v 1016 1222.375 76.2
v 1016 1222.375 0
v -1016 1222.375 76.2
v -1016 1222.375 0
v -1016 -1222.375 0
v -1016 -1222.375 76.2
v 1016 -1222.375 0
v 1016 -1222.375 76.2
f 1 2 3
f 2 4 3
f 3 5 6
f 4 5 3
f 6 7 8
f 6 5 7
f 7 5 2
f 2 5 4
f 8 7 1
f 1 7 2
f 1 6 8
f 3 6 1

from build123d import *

# Parameters (mm, degrees)
F0_W     = 1231.9
F0_H     = 2444.75
F1_DEPTH = 76.2
F2_DEPTH = 400.05
F3_DEPTH = 400.05


with BuildPart() as f1:
    # F0 (on Top) → F1 (new body)
    with BuildSketch(Plane.XY):
        Rectangle(F0_W, F0_H)
    extrude(amount=F1_DEPTH)

    # F2 (add): a face of the model
    f2_faces = [f1.faces().sort_by_distance(p)[0] for p in [
        (-615.95, 0, 38.1),
    ]]
    extrude(f2_faces, amount=F2_DEPTH)

    # F3 (add): a face of the model
    f3_faces = [f1.faces().sort_by_distance(p)[0] for p in [
        (615.95, 0, 38.1),
    ]]
    extrude(f3_faces, amount=F3_DEPTH)


solid = f1.part
